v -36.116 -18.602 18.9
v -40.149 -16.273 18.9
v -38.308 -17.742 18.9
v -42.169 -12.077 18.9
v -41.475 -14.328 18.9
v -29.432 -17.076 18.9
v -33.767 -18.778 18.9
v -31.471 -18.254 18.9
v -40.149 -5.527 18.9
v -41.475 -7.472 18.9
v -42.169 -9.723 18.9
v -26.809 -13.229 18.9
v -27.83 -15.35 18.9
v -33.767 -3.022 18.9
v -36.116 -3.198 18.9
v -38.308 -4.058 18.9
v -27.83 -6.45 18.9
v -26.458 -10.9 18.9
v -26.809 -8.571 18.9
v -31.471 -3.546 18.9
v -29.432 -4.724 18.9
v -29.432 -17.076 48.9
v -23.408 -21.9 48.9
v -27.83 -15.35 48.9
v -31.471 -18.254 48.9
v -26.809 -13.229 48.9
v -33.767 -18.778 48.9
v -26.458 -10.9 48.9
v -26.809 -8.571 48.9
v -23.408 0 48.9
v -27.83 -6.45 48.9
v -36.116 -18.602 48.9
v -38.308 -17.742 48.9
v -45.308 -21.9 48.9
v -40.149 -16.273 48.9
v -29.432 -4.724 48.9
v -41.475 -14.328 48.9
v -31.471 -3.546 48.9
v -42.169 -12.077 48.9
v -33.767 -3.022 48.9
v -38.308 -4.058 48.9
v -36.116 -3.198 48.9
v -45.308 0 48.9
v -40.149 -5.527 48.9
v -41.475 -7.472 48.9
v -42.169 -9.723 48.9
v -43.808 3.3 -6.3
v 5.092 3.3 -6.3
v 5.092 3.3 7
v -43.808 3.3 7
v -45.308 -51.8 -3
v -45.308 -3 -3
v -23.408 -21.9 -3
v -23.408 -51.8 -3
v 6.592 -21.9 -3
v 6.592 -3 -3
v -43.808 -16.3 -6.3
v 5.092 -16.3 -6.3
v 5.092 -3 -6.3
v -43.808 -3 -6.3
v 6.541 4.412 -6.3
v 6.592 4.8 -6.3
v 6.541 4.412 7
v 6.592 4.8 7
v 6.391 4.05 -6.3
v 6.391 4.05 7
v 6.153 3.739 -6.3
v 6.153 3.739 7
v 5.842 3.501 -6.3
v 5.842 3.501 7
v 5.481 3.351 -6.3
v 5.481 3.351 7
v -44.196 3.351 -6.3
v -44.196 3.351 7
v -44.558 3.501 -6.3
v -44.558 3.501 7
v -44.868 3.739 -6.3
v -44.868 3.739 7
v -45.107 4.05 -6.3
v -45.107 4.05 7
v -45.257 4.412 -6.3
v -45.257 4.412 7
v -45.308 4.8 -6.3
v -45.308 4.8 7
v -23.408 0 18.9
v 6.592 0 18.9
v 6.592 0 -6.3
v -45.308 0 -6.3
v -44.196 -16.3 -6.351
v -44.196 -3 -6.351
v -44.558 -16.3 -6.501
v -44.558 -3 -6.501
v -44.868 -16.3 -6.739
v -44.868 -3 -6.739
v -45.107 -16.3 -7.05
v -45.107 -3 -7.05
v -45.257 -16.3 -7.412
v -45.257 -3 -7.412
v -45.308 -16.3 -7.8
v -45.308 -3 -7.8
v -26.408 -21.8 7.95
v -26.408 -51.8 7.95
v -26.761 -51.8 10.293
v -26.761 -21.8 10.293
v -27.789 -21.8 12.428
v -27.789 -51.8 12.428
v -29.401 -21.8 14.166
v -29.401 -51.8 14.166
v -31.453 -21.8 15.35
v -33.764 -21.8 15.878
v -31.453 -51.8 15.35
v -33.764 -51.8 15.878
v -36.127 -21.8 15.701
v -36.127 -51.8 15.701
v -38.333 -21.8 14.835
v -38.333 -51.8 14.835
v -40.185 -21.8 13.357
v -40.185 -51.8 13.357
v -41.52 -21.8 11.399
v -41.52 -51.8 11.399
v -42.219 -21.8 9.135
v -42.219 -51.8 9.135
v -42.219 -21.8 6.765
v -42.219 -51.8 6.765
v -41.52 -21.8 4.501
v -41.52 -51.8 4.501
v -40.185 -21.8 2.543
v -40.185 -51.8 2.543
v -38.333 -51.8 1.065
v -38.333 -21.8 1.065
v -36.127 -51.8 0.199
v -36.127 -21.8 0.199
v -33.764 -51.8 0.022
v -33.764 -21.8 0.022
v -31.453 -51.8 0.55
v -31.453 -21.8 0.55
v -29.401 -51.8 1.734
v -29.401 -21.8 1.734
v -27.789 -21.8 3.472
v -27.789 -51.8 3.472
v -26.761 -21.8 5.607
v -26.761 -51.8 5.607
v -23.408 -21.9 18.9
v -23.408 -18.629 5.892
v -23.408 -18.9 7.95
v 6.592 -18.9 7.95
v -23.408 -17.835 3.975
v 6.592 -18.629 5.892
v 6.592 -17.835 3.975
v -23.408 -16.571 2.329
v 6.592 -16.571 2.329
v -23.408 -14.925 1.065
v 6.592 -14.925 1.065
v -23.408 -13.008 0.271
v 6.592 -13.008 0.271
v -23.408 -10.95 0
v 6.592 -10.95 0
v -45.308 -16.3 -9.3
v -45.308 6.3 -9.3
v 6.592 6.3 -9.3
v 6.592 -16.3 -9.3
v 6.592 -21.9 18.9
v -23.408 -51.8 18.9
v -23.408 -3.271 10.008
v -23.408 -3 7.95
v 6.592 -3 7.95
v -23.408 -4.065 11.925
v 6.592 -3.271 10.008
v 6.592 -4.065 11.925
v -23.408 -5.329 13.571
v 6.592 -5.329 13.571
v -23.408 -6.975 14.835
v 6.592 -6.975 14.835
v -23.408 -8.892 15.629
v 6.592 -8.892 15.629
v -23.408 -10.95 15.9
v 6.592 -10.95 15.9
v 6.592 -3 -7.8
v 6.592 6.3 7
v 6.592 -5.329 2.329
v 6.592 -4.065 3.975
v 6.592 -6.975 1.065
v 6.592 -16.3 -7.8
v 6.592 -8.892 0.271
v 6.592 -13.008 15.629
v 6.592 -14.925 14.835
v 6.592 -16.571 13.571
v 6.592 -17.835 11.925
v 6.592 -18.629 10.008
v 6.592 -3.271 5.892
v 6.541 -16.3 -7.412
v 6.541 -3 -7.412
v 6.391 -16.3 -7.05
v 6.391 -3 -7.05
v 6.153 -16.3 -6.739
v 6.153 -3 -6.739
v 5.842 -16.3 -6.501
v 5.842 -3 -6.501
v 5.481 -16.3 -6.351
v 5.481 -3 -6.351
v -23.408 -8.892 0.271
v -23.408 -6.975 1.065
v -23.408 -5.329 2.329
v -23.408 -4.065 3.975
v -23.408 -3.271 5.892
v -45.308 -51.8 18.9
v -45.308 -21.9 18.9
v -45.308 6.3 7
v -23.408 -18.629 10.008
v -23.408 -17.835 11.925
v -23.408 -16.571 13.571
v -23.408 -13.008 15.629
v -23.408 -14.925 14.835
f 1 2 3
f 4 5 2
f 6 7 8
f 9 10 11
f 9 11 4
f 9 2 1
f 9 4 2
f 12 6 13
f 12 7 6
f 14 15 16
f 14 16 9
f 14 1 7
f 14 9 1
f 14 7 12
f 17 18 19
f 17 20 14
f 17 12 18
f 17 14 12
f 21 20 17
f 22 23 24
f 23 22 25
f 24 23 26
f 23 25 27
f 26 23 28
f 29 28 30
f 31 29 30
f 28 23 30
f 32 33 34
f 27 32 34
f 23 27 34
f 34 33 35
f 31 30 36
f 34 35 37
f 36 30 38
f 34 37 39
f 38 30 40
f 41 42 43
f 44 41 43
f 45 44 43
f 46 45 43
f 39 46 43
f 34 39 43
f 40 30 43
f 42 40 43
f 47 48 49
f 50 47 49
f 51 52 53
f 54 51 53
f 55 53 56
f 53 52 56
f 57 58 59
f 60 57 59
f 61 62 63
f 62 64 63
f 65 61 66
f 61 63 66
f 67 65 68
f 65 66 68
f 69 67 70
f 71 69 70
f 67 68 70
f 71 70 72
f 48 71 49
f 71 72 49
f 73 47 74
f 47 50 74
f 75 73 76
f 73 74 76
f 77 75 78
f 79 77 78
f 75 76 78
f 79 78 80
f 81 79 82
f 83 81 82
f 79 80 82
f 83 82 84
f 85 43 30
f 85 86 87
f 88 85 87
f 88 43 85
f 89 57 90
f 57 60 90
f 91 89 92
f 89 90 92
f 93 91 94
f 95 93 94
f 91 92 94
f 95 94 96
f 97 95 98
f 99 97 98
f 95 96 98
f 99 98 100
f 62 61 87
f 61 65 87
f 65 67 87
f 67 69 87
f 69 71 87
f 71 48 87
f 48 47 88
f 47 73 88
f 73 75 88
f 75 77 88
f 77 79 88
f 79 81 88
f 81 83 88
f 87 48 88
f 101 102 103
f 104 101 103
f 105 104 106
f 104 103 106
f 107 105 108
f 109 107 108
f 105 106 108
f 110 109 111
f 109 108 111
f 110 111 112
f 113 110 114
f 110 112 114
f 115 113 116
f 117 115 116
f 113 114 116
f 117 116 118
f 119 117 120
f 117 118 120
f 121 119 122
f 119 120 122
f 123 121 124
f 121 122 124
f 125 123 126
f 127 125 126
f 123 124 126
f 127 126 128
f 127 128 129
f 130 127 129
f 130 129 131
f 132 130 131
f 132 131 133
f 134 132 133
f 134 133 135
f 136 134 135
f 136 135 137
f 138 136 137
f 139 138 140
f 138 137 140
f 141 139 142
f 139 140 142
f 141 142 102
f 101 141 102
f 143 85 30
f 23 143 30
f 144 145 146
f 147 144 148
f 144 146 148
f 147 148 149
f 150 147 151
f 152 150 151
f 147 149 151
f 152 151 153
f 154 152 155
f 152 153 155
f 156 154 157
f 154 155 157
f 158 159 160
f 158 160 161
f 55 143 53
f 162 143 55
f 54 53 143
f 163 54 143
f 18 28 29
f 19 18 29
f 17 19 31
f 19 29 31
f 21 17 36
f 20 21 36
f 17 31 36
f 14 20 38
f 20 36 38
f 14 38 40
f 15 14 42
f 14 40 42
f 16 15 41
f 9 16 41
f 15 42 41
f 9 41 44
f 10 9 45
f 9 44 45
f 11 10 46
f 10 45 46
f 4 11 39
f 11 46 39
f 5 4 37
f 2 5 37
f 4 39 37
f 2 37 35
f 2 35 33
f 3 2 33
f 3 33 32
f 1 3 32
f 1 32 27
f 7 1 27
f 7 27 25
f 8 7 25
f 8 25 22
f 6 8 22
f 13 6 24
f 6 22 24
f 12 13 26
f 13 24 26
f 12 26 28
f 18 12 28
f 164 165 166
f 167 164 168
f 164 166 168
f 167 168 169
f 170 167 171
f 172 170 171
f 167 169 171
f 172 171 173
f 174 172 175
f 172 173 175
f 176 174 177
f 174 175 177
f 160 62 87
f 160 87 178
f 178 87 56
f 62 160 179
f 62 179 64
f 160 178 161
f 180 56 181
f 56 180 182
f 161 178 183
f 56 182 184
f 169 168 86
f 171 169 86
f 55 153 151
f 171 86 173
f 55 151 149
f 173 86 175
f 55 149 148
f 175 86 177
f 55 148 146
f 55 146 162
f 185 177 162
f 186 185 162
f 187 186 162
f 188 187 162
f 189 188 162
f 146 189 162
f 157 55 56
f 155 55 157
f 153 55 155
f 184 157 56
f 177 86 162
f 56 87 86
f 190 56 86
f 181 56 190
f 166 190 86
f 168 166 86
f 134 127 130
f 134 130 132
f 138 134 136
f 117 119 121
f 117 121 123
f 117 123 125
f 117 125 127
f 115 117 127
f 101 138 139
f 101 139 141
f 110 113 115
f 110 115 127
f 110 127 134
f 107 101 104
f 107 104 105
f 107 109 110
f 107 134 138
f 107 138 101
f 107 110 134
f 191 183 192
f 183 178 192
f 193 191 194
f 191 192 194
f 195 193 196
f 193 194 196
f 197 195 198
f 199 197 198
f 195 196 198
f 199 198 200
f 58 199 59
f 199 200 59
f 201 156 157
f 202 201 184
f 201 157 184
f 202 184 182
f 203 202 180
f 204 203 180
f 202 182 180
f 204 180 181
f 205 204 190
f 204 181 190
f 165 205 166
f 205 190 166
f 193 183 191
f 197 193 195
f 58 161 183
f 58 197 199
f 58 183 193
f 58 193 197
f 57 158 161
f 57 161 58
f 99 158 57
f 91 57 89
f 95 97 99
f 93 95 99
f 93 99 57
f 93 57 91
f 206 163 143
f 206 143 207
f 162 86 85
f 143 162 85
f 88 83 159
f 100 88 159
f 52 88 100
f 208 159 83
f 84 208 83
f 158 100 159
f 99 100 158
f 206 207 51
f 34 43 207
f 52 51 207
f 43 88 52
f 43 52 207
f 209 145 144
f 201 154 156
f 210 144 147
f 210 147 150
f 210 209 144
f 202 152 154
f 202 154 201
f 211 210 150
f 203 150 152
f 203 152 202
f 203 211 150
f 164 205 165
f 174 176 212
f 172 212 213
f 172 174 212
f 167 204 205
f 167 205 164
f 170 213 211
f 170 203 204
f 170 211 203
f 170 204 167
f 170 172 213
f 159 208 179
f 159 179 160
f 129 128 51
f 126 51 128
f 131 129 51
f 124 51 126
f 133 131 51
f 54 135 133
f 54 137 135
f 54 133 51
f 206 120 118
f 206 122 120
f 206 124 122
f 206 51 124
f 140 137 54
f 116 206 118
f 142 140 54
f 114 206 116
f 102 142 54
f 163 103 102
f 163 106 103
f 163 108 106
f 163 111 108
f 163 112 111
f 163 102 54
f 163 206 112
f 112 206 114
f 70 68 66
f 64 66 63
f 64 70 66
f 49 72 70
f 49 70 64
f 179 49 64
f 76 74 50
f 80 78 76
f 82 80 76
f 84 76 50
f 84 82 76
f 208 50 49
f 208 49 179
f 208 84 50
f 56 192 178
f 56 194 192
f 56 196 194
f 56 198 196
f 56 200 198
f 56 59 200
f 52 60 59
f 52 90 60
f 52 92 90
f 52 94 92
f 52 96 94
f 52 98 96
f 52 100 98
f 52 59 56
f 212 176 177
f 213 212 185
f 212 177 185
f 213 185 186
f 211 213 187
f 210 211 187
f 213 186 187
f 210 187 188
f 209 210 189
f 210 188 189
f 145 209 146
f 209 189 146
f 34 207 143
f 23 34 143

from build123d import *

# Parameters (mm, degrees)
F0_W      = 27
F0_H      = 15.9
F0_W_2    = 15.9
F0_H_2    = 27
F0_W_3    = 3
F0_H_3    = 3
F1_DEPTH  = 21.9
F2_DEPTH  = 51.8
F3_R      = 7.95
F6_DEPTH  = 30
F7_DEPTH  = 30
F4_R      = 7.9
F8_DEPTH  = 30
F9_W      = 3.3
F9_H      = 3
F10_DEPTH = 51.9
F11_R     = 1.5


with BuildPart() as f1:
    # F0 (on Front) → F1 (new body)
    with BuildSketch(Plane.XZ):
        with BuildLine():
            Line((-34.3576915575, 15.9), (-42.3076915575, 15.9))
            Line((-42.3076915575, 15.9), (-42.3076915575, 7.9499999931))
            ThreePointArc((-42.3076915575, 7.9499999931), (-39.9791904704, 13.571498908), (-34.3576915575, 15.9))
        make_face()
        with BuildLine():
            ThreePointArc((-34.3576915575, 15.9), (-39.9791904704, 13.571498908), (-42.3076915575, 7.9499999931))
            ThreePointArc((-42.3076915575, 7.9499999931), (-39.9791904655, 2.3285010871), (-34.3576915575, 0))
            ThreePointArc((-34.3576915575, 0), (-28.7361926471, 2.3285010896), (-26.4076915575, 7.95))
            ThreePointArc((-26.4076915575, 7.95), (-28.7361926471, 13.5714989104), (-34.3576915575, 15.9))
        make_face()
        Polygon((-42.3076915575, 18.9), (-42.3076915575, 45.9), (-26.4076915575, 45.9), (-26.4076915575, 18.9), (-23.4076915575, 18.9), (-23.4076915575, 48.9), (-45.3076915575, 48.9), (-45.3076915575, 18.9), align=None)
        with Locations((-9.9076915575, 7.95)):
            Rectangle(F0_W, F0_H)
        with Locations((-34.3576915575, 32.4)):
            Rectangle(F0_W_2, F0_H_2)
        with BuildLine():
            ThreePointArc((-34.3576915575, 0), (-39.9791904655, 2.3285010871), (-42.3076915575, 7.9499999931))
            Line((-42.3076915575, 7.9499999931), (-42.3076915575, 0))
            Line((-42.3076915575, 0), (-34.3576915575, 0))
        make_face()
        with BuildLine():
            Line((-26.4076915575, 0), (-26.4076915575, 7.95))
            ThreePointArc((-26.4076915575, 7.95), (-28.7361926471, 2.3285010896), (-34.3576915575, 0))
            Line((-34.3576915575, 0), (-26.4076915575, 0))
        make_face()
        with BuildLine():
            Line((-26.4076915575, 7.95), (-26.4076915575, 15.9))
            Line((-26.4076915575, 15.9), (-34.3576915575, 15.9))
            ThreePointArc((-34.3576915575, 15.9), (-28.7361926471, 13.5714989104), (-26.4076915575, 7.95))
        make_face()
        Polygon((6.5923084425, 18.9), (-23.4076915575, 18.9), (-23.4076915575, 15.9), (3.5923084425, 15.9), (3.5923084425, 0), (-23.4076915575, 0), (-23.4076915575, -3), (6.5923084425, -3), align=None)
        Polygon((-26.4076915575, 18.9), (-42.3076915575, 18.9), (-42.3076915575, 15.9), (-34.3576915575, 15.9), (-26.4076915575, 15.9), align=None)
        Polygon((-23.4076915575, 15.9), (-26.4076915575, 15.9), (-26.4076915575, 7.95), (-26.4076915575, 0), (-23.4076915575, 0), align=None)
        Polygon((-42.3076915575, 15.9), (-42.3076915575, 18.9), (-45.3076915575, 18.9), (-45.3076915575, -3), (-23.4076915575, -3), (-23.4076915575, 0), (-26.4076915575, 0), (-34.3576915575, 0), (-42.3076915575, 0), (-42.3076915575, 7.9499999931), align=None)
        with Locations((-24.9076915575, 17.4)):
            Rectangle(F0_W_3, F0_H_3)
    extrude(amount=F1_DEPTH)

    # F0 (on Front) → F2 (join)
    with BuildSketch(Plane.XZ):
        Polygon((-42.3076915575, 15.9), (-42.3076915575, 18.9), (-45.3076915575, 18.9), (-45.3076915575, -3), (-23.4076915575, -3), (-23.4076915575, 0), (-26.4076915575, 0), (-34.3576915575, 0), (-42.3076915575, 0), (-42.3076915575, 7.9499999931), align=None)
        with BuildLine():
            ThreePointArc((-34.3576915575, 15.9), (-39.9791904704, 13.571498908), (-42.3076915575, 7.9499999931))
            ThreePointArc((-42.3076915575, 7.9499999931), (-39.9791904655, 2.3285010871), (-34.3576915575, 0))
            ThreePointArc((-34.3576915575, 0), (-28.7361926471, 2.3285010896), (-26.4076915575, 7.95))
            ThreePointArc((-26.4076915575, 7.95), (-28.7361926471, 13.5714989104), (-34.3576915575, 15.9))
        make_face()
        Polygon((-26.4076915575, 18.9), (-42.3076915575, 18.9), (-42.3076915575, 15.9), (-34.3576915575, 15.9), (-26.4076915575, 15.9), align=None)
        Polygon((-23.4076915575, 15.9), (-26.4076915575, 15.9), (-26.4076915575, 7.95), (-26.4076915575, 0), (-23.4076915575, 0), align=None)
        with Locations((-24.9076915575, 17.4)):
            Rectangle(F0_W_3, F0_H_3)
        with BuildLine():
            Line((-26.4076915575, 7.95), (-26.4076915575, 15.9))
            Line((-26.4076915575, 15.9), (-34.3576915575, 15.9))
            ThreePointArc((-34.3576915575, 15.9), (-28.7361926471, 13.5714989104), (-26.4076915575, 7.95))
        make_face()
        with BuildLine():
            Line((-34.3576915575, 15.9), (-42.3076915575, 15.9))
            Line((-42.3076915575, 15.9), (-42.3076915575, 7.9499999931))
            ThreePointArc((-42.3076915575, 7.9499999931), (-39.9791904704, 13.571498908), (-34.3576915575, 15.9))
        make_face()
        with BuildLine():
            ThreePointArc((-34.3576915575, 0), (-39.9791904655, 2.3285010871), (-42.3076915575, 7.9499999931))
            Line((-42.3076915575, 7.9499999931), (-42.3076915575, 0))
            Line((-42.3076915575, 0), (-34.3576915575, 0))
        make_face()
        with BuildLine():
            Line((-26.4076915575, 0), (-26.4076915575, 7.95))
            ThreePointArc((-26.4076915575, 7.95), (-28.7361926471, 2.3285010896), (-34.3576915575, 0))
            Line((-34.3576915575, 0), (-26.4076915575, 0))
        make_face()
    extrude(amount=F2_DEPTH)

    # F3 (on face) → F6 (cut)
    with BuildSketch(Plane.XZ.offset(51.8)):
        with Locations((-34.3576915575, 7.95)):
            Circle(F3_R)
    extrude(amount=-F6_DEPTH, mode=Mode.SUBTRACT)

    # F5 (on face) → F7 (cut)
    with BuildSketch(Plane.YZ.offset(6.5923084425)):
        with BuildLine():
            ThreePointArc((-3, 7.95), (-5.3285010896, 13.5714989104), (-10.95, 15.9))
            ThreePointArc((-10.95, 15.9), (-16.5714989104, 13.5714989104), (-18.9, 7.95))
            ThreePointArc((-18.9, 7.95), (-16.5714989104, 2.3285010896), (-10.95, 0))
            ThreePointArc((-10.95, 0), (-5.3285010896, 2.3285010896), (-3, 7.95))
        make_face()
    extrude(amount=-F7_DEPTH, mode=Mode.SUBTRACT)

    # F4 (on face) → F8 (cut)
    with BuildSketch(Plane.XY.offset(48.9)):
        with Locations((-34.3576915575, -10.9)):
            Circle(F4_R)
    extrude(amount=-F8_DEPTH, mode=Mode.SUBTRACT)

    # F9 (on face) → F10 (join)
    with BuildSketch(Plane(origin=(-45.3076915575, 0, 0), x_dir=(0, -1, 0), z_dir=(-1, 0, 0))):
        Polygon((3, -3), (0, -3), (0, -6.3), (0, -9.3), (16.3, -9.3), (16.3, -6.3), (3, -6.3), align=None)
        with Locations((-1.65, -7.8)):
            Rectangle(F9_W, F9_H)
        Polygon((-3.3, -9.3), (-3.3, -6.3), (-3.3, 7), (-6.3, 7), (-6.3, -9.3), align=None)
    extrude(amount=-F10_DEPTH)

    # F11
    f11_edges = [f1.edges().sort_by_distance(p)[0] for p in [
        (-45.307692, -9.65, -6.3),
        (6.592308, -9.65, -6.3),
        (-45.307692, 3.3, 0.35),
        (6.592308, 3.3, 0.35),
    ]]
    fillet(f11_edges, radius=F11_R)


solid = f1.part
